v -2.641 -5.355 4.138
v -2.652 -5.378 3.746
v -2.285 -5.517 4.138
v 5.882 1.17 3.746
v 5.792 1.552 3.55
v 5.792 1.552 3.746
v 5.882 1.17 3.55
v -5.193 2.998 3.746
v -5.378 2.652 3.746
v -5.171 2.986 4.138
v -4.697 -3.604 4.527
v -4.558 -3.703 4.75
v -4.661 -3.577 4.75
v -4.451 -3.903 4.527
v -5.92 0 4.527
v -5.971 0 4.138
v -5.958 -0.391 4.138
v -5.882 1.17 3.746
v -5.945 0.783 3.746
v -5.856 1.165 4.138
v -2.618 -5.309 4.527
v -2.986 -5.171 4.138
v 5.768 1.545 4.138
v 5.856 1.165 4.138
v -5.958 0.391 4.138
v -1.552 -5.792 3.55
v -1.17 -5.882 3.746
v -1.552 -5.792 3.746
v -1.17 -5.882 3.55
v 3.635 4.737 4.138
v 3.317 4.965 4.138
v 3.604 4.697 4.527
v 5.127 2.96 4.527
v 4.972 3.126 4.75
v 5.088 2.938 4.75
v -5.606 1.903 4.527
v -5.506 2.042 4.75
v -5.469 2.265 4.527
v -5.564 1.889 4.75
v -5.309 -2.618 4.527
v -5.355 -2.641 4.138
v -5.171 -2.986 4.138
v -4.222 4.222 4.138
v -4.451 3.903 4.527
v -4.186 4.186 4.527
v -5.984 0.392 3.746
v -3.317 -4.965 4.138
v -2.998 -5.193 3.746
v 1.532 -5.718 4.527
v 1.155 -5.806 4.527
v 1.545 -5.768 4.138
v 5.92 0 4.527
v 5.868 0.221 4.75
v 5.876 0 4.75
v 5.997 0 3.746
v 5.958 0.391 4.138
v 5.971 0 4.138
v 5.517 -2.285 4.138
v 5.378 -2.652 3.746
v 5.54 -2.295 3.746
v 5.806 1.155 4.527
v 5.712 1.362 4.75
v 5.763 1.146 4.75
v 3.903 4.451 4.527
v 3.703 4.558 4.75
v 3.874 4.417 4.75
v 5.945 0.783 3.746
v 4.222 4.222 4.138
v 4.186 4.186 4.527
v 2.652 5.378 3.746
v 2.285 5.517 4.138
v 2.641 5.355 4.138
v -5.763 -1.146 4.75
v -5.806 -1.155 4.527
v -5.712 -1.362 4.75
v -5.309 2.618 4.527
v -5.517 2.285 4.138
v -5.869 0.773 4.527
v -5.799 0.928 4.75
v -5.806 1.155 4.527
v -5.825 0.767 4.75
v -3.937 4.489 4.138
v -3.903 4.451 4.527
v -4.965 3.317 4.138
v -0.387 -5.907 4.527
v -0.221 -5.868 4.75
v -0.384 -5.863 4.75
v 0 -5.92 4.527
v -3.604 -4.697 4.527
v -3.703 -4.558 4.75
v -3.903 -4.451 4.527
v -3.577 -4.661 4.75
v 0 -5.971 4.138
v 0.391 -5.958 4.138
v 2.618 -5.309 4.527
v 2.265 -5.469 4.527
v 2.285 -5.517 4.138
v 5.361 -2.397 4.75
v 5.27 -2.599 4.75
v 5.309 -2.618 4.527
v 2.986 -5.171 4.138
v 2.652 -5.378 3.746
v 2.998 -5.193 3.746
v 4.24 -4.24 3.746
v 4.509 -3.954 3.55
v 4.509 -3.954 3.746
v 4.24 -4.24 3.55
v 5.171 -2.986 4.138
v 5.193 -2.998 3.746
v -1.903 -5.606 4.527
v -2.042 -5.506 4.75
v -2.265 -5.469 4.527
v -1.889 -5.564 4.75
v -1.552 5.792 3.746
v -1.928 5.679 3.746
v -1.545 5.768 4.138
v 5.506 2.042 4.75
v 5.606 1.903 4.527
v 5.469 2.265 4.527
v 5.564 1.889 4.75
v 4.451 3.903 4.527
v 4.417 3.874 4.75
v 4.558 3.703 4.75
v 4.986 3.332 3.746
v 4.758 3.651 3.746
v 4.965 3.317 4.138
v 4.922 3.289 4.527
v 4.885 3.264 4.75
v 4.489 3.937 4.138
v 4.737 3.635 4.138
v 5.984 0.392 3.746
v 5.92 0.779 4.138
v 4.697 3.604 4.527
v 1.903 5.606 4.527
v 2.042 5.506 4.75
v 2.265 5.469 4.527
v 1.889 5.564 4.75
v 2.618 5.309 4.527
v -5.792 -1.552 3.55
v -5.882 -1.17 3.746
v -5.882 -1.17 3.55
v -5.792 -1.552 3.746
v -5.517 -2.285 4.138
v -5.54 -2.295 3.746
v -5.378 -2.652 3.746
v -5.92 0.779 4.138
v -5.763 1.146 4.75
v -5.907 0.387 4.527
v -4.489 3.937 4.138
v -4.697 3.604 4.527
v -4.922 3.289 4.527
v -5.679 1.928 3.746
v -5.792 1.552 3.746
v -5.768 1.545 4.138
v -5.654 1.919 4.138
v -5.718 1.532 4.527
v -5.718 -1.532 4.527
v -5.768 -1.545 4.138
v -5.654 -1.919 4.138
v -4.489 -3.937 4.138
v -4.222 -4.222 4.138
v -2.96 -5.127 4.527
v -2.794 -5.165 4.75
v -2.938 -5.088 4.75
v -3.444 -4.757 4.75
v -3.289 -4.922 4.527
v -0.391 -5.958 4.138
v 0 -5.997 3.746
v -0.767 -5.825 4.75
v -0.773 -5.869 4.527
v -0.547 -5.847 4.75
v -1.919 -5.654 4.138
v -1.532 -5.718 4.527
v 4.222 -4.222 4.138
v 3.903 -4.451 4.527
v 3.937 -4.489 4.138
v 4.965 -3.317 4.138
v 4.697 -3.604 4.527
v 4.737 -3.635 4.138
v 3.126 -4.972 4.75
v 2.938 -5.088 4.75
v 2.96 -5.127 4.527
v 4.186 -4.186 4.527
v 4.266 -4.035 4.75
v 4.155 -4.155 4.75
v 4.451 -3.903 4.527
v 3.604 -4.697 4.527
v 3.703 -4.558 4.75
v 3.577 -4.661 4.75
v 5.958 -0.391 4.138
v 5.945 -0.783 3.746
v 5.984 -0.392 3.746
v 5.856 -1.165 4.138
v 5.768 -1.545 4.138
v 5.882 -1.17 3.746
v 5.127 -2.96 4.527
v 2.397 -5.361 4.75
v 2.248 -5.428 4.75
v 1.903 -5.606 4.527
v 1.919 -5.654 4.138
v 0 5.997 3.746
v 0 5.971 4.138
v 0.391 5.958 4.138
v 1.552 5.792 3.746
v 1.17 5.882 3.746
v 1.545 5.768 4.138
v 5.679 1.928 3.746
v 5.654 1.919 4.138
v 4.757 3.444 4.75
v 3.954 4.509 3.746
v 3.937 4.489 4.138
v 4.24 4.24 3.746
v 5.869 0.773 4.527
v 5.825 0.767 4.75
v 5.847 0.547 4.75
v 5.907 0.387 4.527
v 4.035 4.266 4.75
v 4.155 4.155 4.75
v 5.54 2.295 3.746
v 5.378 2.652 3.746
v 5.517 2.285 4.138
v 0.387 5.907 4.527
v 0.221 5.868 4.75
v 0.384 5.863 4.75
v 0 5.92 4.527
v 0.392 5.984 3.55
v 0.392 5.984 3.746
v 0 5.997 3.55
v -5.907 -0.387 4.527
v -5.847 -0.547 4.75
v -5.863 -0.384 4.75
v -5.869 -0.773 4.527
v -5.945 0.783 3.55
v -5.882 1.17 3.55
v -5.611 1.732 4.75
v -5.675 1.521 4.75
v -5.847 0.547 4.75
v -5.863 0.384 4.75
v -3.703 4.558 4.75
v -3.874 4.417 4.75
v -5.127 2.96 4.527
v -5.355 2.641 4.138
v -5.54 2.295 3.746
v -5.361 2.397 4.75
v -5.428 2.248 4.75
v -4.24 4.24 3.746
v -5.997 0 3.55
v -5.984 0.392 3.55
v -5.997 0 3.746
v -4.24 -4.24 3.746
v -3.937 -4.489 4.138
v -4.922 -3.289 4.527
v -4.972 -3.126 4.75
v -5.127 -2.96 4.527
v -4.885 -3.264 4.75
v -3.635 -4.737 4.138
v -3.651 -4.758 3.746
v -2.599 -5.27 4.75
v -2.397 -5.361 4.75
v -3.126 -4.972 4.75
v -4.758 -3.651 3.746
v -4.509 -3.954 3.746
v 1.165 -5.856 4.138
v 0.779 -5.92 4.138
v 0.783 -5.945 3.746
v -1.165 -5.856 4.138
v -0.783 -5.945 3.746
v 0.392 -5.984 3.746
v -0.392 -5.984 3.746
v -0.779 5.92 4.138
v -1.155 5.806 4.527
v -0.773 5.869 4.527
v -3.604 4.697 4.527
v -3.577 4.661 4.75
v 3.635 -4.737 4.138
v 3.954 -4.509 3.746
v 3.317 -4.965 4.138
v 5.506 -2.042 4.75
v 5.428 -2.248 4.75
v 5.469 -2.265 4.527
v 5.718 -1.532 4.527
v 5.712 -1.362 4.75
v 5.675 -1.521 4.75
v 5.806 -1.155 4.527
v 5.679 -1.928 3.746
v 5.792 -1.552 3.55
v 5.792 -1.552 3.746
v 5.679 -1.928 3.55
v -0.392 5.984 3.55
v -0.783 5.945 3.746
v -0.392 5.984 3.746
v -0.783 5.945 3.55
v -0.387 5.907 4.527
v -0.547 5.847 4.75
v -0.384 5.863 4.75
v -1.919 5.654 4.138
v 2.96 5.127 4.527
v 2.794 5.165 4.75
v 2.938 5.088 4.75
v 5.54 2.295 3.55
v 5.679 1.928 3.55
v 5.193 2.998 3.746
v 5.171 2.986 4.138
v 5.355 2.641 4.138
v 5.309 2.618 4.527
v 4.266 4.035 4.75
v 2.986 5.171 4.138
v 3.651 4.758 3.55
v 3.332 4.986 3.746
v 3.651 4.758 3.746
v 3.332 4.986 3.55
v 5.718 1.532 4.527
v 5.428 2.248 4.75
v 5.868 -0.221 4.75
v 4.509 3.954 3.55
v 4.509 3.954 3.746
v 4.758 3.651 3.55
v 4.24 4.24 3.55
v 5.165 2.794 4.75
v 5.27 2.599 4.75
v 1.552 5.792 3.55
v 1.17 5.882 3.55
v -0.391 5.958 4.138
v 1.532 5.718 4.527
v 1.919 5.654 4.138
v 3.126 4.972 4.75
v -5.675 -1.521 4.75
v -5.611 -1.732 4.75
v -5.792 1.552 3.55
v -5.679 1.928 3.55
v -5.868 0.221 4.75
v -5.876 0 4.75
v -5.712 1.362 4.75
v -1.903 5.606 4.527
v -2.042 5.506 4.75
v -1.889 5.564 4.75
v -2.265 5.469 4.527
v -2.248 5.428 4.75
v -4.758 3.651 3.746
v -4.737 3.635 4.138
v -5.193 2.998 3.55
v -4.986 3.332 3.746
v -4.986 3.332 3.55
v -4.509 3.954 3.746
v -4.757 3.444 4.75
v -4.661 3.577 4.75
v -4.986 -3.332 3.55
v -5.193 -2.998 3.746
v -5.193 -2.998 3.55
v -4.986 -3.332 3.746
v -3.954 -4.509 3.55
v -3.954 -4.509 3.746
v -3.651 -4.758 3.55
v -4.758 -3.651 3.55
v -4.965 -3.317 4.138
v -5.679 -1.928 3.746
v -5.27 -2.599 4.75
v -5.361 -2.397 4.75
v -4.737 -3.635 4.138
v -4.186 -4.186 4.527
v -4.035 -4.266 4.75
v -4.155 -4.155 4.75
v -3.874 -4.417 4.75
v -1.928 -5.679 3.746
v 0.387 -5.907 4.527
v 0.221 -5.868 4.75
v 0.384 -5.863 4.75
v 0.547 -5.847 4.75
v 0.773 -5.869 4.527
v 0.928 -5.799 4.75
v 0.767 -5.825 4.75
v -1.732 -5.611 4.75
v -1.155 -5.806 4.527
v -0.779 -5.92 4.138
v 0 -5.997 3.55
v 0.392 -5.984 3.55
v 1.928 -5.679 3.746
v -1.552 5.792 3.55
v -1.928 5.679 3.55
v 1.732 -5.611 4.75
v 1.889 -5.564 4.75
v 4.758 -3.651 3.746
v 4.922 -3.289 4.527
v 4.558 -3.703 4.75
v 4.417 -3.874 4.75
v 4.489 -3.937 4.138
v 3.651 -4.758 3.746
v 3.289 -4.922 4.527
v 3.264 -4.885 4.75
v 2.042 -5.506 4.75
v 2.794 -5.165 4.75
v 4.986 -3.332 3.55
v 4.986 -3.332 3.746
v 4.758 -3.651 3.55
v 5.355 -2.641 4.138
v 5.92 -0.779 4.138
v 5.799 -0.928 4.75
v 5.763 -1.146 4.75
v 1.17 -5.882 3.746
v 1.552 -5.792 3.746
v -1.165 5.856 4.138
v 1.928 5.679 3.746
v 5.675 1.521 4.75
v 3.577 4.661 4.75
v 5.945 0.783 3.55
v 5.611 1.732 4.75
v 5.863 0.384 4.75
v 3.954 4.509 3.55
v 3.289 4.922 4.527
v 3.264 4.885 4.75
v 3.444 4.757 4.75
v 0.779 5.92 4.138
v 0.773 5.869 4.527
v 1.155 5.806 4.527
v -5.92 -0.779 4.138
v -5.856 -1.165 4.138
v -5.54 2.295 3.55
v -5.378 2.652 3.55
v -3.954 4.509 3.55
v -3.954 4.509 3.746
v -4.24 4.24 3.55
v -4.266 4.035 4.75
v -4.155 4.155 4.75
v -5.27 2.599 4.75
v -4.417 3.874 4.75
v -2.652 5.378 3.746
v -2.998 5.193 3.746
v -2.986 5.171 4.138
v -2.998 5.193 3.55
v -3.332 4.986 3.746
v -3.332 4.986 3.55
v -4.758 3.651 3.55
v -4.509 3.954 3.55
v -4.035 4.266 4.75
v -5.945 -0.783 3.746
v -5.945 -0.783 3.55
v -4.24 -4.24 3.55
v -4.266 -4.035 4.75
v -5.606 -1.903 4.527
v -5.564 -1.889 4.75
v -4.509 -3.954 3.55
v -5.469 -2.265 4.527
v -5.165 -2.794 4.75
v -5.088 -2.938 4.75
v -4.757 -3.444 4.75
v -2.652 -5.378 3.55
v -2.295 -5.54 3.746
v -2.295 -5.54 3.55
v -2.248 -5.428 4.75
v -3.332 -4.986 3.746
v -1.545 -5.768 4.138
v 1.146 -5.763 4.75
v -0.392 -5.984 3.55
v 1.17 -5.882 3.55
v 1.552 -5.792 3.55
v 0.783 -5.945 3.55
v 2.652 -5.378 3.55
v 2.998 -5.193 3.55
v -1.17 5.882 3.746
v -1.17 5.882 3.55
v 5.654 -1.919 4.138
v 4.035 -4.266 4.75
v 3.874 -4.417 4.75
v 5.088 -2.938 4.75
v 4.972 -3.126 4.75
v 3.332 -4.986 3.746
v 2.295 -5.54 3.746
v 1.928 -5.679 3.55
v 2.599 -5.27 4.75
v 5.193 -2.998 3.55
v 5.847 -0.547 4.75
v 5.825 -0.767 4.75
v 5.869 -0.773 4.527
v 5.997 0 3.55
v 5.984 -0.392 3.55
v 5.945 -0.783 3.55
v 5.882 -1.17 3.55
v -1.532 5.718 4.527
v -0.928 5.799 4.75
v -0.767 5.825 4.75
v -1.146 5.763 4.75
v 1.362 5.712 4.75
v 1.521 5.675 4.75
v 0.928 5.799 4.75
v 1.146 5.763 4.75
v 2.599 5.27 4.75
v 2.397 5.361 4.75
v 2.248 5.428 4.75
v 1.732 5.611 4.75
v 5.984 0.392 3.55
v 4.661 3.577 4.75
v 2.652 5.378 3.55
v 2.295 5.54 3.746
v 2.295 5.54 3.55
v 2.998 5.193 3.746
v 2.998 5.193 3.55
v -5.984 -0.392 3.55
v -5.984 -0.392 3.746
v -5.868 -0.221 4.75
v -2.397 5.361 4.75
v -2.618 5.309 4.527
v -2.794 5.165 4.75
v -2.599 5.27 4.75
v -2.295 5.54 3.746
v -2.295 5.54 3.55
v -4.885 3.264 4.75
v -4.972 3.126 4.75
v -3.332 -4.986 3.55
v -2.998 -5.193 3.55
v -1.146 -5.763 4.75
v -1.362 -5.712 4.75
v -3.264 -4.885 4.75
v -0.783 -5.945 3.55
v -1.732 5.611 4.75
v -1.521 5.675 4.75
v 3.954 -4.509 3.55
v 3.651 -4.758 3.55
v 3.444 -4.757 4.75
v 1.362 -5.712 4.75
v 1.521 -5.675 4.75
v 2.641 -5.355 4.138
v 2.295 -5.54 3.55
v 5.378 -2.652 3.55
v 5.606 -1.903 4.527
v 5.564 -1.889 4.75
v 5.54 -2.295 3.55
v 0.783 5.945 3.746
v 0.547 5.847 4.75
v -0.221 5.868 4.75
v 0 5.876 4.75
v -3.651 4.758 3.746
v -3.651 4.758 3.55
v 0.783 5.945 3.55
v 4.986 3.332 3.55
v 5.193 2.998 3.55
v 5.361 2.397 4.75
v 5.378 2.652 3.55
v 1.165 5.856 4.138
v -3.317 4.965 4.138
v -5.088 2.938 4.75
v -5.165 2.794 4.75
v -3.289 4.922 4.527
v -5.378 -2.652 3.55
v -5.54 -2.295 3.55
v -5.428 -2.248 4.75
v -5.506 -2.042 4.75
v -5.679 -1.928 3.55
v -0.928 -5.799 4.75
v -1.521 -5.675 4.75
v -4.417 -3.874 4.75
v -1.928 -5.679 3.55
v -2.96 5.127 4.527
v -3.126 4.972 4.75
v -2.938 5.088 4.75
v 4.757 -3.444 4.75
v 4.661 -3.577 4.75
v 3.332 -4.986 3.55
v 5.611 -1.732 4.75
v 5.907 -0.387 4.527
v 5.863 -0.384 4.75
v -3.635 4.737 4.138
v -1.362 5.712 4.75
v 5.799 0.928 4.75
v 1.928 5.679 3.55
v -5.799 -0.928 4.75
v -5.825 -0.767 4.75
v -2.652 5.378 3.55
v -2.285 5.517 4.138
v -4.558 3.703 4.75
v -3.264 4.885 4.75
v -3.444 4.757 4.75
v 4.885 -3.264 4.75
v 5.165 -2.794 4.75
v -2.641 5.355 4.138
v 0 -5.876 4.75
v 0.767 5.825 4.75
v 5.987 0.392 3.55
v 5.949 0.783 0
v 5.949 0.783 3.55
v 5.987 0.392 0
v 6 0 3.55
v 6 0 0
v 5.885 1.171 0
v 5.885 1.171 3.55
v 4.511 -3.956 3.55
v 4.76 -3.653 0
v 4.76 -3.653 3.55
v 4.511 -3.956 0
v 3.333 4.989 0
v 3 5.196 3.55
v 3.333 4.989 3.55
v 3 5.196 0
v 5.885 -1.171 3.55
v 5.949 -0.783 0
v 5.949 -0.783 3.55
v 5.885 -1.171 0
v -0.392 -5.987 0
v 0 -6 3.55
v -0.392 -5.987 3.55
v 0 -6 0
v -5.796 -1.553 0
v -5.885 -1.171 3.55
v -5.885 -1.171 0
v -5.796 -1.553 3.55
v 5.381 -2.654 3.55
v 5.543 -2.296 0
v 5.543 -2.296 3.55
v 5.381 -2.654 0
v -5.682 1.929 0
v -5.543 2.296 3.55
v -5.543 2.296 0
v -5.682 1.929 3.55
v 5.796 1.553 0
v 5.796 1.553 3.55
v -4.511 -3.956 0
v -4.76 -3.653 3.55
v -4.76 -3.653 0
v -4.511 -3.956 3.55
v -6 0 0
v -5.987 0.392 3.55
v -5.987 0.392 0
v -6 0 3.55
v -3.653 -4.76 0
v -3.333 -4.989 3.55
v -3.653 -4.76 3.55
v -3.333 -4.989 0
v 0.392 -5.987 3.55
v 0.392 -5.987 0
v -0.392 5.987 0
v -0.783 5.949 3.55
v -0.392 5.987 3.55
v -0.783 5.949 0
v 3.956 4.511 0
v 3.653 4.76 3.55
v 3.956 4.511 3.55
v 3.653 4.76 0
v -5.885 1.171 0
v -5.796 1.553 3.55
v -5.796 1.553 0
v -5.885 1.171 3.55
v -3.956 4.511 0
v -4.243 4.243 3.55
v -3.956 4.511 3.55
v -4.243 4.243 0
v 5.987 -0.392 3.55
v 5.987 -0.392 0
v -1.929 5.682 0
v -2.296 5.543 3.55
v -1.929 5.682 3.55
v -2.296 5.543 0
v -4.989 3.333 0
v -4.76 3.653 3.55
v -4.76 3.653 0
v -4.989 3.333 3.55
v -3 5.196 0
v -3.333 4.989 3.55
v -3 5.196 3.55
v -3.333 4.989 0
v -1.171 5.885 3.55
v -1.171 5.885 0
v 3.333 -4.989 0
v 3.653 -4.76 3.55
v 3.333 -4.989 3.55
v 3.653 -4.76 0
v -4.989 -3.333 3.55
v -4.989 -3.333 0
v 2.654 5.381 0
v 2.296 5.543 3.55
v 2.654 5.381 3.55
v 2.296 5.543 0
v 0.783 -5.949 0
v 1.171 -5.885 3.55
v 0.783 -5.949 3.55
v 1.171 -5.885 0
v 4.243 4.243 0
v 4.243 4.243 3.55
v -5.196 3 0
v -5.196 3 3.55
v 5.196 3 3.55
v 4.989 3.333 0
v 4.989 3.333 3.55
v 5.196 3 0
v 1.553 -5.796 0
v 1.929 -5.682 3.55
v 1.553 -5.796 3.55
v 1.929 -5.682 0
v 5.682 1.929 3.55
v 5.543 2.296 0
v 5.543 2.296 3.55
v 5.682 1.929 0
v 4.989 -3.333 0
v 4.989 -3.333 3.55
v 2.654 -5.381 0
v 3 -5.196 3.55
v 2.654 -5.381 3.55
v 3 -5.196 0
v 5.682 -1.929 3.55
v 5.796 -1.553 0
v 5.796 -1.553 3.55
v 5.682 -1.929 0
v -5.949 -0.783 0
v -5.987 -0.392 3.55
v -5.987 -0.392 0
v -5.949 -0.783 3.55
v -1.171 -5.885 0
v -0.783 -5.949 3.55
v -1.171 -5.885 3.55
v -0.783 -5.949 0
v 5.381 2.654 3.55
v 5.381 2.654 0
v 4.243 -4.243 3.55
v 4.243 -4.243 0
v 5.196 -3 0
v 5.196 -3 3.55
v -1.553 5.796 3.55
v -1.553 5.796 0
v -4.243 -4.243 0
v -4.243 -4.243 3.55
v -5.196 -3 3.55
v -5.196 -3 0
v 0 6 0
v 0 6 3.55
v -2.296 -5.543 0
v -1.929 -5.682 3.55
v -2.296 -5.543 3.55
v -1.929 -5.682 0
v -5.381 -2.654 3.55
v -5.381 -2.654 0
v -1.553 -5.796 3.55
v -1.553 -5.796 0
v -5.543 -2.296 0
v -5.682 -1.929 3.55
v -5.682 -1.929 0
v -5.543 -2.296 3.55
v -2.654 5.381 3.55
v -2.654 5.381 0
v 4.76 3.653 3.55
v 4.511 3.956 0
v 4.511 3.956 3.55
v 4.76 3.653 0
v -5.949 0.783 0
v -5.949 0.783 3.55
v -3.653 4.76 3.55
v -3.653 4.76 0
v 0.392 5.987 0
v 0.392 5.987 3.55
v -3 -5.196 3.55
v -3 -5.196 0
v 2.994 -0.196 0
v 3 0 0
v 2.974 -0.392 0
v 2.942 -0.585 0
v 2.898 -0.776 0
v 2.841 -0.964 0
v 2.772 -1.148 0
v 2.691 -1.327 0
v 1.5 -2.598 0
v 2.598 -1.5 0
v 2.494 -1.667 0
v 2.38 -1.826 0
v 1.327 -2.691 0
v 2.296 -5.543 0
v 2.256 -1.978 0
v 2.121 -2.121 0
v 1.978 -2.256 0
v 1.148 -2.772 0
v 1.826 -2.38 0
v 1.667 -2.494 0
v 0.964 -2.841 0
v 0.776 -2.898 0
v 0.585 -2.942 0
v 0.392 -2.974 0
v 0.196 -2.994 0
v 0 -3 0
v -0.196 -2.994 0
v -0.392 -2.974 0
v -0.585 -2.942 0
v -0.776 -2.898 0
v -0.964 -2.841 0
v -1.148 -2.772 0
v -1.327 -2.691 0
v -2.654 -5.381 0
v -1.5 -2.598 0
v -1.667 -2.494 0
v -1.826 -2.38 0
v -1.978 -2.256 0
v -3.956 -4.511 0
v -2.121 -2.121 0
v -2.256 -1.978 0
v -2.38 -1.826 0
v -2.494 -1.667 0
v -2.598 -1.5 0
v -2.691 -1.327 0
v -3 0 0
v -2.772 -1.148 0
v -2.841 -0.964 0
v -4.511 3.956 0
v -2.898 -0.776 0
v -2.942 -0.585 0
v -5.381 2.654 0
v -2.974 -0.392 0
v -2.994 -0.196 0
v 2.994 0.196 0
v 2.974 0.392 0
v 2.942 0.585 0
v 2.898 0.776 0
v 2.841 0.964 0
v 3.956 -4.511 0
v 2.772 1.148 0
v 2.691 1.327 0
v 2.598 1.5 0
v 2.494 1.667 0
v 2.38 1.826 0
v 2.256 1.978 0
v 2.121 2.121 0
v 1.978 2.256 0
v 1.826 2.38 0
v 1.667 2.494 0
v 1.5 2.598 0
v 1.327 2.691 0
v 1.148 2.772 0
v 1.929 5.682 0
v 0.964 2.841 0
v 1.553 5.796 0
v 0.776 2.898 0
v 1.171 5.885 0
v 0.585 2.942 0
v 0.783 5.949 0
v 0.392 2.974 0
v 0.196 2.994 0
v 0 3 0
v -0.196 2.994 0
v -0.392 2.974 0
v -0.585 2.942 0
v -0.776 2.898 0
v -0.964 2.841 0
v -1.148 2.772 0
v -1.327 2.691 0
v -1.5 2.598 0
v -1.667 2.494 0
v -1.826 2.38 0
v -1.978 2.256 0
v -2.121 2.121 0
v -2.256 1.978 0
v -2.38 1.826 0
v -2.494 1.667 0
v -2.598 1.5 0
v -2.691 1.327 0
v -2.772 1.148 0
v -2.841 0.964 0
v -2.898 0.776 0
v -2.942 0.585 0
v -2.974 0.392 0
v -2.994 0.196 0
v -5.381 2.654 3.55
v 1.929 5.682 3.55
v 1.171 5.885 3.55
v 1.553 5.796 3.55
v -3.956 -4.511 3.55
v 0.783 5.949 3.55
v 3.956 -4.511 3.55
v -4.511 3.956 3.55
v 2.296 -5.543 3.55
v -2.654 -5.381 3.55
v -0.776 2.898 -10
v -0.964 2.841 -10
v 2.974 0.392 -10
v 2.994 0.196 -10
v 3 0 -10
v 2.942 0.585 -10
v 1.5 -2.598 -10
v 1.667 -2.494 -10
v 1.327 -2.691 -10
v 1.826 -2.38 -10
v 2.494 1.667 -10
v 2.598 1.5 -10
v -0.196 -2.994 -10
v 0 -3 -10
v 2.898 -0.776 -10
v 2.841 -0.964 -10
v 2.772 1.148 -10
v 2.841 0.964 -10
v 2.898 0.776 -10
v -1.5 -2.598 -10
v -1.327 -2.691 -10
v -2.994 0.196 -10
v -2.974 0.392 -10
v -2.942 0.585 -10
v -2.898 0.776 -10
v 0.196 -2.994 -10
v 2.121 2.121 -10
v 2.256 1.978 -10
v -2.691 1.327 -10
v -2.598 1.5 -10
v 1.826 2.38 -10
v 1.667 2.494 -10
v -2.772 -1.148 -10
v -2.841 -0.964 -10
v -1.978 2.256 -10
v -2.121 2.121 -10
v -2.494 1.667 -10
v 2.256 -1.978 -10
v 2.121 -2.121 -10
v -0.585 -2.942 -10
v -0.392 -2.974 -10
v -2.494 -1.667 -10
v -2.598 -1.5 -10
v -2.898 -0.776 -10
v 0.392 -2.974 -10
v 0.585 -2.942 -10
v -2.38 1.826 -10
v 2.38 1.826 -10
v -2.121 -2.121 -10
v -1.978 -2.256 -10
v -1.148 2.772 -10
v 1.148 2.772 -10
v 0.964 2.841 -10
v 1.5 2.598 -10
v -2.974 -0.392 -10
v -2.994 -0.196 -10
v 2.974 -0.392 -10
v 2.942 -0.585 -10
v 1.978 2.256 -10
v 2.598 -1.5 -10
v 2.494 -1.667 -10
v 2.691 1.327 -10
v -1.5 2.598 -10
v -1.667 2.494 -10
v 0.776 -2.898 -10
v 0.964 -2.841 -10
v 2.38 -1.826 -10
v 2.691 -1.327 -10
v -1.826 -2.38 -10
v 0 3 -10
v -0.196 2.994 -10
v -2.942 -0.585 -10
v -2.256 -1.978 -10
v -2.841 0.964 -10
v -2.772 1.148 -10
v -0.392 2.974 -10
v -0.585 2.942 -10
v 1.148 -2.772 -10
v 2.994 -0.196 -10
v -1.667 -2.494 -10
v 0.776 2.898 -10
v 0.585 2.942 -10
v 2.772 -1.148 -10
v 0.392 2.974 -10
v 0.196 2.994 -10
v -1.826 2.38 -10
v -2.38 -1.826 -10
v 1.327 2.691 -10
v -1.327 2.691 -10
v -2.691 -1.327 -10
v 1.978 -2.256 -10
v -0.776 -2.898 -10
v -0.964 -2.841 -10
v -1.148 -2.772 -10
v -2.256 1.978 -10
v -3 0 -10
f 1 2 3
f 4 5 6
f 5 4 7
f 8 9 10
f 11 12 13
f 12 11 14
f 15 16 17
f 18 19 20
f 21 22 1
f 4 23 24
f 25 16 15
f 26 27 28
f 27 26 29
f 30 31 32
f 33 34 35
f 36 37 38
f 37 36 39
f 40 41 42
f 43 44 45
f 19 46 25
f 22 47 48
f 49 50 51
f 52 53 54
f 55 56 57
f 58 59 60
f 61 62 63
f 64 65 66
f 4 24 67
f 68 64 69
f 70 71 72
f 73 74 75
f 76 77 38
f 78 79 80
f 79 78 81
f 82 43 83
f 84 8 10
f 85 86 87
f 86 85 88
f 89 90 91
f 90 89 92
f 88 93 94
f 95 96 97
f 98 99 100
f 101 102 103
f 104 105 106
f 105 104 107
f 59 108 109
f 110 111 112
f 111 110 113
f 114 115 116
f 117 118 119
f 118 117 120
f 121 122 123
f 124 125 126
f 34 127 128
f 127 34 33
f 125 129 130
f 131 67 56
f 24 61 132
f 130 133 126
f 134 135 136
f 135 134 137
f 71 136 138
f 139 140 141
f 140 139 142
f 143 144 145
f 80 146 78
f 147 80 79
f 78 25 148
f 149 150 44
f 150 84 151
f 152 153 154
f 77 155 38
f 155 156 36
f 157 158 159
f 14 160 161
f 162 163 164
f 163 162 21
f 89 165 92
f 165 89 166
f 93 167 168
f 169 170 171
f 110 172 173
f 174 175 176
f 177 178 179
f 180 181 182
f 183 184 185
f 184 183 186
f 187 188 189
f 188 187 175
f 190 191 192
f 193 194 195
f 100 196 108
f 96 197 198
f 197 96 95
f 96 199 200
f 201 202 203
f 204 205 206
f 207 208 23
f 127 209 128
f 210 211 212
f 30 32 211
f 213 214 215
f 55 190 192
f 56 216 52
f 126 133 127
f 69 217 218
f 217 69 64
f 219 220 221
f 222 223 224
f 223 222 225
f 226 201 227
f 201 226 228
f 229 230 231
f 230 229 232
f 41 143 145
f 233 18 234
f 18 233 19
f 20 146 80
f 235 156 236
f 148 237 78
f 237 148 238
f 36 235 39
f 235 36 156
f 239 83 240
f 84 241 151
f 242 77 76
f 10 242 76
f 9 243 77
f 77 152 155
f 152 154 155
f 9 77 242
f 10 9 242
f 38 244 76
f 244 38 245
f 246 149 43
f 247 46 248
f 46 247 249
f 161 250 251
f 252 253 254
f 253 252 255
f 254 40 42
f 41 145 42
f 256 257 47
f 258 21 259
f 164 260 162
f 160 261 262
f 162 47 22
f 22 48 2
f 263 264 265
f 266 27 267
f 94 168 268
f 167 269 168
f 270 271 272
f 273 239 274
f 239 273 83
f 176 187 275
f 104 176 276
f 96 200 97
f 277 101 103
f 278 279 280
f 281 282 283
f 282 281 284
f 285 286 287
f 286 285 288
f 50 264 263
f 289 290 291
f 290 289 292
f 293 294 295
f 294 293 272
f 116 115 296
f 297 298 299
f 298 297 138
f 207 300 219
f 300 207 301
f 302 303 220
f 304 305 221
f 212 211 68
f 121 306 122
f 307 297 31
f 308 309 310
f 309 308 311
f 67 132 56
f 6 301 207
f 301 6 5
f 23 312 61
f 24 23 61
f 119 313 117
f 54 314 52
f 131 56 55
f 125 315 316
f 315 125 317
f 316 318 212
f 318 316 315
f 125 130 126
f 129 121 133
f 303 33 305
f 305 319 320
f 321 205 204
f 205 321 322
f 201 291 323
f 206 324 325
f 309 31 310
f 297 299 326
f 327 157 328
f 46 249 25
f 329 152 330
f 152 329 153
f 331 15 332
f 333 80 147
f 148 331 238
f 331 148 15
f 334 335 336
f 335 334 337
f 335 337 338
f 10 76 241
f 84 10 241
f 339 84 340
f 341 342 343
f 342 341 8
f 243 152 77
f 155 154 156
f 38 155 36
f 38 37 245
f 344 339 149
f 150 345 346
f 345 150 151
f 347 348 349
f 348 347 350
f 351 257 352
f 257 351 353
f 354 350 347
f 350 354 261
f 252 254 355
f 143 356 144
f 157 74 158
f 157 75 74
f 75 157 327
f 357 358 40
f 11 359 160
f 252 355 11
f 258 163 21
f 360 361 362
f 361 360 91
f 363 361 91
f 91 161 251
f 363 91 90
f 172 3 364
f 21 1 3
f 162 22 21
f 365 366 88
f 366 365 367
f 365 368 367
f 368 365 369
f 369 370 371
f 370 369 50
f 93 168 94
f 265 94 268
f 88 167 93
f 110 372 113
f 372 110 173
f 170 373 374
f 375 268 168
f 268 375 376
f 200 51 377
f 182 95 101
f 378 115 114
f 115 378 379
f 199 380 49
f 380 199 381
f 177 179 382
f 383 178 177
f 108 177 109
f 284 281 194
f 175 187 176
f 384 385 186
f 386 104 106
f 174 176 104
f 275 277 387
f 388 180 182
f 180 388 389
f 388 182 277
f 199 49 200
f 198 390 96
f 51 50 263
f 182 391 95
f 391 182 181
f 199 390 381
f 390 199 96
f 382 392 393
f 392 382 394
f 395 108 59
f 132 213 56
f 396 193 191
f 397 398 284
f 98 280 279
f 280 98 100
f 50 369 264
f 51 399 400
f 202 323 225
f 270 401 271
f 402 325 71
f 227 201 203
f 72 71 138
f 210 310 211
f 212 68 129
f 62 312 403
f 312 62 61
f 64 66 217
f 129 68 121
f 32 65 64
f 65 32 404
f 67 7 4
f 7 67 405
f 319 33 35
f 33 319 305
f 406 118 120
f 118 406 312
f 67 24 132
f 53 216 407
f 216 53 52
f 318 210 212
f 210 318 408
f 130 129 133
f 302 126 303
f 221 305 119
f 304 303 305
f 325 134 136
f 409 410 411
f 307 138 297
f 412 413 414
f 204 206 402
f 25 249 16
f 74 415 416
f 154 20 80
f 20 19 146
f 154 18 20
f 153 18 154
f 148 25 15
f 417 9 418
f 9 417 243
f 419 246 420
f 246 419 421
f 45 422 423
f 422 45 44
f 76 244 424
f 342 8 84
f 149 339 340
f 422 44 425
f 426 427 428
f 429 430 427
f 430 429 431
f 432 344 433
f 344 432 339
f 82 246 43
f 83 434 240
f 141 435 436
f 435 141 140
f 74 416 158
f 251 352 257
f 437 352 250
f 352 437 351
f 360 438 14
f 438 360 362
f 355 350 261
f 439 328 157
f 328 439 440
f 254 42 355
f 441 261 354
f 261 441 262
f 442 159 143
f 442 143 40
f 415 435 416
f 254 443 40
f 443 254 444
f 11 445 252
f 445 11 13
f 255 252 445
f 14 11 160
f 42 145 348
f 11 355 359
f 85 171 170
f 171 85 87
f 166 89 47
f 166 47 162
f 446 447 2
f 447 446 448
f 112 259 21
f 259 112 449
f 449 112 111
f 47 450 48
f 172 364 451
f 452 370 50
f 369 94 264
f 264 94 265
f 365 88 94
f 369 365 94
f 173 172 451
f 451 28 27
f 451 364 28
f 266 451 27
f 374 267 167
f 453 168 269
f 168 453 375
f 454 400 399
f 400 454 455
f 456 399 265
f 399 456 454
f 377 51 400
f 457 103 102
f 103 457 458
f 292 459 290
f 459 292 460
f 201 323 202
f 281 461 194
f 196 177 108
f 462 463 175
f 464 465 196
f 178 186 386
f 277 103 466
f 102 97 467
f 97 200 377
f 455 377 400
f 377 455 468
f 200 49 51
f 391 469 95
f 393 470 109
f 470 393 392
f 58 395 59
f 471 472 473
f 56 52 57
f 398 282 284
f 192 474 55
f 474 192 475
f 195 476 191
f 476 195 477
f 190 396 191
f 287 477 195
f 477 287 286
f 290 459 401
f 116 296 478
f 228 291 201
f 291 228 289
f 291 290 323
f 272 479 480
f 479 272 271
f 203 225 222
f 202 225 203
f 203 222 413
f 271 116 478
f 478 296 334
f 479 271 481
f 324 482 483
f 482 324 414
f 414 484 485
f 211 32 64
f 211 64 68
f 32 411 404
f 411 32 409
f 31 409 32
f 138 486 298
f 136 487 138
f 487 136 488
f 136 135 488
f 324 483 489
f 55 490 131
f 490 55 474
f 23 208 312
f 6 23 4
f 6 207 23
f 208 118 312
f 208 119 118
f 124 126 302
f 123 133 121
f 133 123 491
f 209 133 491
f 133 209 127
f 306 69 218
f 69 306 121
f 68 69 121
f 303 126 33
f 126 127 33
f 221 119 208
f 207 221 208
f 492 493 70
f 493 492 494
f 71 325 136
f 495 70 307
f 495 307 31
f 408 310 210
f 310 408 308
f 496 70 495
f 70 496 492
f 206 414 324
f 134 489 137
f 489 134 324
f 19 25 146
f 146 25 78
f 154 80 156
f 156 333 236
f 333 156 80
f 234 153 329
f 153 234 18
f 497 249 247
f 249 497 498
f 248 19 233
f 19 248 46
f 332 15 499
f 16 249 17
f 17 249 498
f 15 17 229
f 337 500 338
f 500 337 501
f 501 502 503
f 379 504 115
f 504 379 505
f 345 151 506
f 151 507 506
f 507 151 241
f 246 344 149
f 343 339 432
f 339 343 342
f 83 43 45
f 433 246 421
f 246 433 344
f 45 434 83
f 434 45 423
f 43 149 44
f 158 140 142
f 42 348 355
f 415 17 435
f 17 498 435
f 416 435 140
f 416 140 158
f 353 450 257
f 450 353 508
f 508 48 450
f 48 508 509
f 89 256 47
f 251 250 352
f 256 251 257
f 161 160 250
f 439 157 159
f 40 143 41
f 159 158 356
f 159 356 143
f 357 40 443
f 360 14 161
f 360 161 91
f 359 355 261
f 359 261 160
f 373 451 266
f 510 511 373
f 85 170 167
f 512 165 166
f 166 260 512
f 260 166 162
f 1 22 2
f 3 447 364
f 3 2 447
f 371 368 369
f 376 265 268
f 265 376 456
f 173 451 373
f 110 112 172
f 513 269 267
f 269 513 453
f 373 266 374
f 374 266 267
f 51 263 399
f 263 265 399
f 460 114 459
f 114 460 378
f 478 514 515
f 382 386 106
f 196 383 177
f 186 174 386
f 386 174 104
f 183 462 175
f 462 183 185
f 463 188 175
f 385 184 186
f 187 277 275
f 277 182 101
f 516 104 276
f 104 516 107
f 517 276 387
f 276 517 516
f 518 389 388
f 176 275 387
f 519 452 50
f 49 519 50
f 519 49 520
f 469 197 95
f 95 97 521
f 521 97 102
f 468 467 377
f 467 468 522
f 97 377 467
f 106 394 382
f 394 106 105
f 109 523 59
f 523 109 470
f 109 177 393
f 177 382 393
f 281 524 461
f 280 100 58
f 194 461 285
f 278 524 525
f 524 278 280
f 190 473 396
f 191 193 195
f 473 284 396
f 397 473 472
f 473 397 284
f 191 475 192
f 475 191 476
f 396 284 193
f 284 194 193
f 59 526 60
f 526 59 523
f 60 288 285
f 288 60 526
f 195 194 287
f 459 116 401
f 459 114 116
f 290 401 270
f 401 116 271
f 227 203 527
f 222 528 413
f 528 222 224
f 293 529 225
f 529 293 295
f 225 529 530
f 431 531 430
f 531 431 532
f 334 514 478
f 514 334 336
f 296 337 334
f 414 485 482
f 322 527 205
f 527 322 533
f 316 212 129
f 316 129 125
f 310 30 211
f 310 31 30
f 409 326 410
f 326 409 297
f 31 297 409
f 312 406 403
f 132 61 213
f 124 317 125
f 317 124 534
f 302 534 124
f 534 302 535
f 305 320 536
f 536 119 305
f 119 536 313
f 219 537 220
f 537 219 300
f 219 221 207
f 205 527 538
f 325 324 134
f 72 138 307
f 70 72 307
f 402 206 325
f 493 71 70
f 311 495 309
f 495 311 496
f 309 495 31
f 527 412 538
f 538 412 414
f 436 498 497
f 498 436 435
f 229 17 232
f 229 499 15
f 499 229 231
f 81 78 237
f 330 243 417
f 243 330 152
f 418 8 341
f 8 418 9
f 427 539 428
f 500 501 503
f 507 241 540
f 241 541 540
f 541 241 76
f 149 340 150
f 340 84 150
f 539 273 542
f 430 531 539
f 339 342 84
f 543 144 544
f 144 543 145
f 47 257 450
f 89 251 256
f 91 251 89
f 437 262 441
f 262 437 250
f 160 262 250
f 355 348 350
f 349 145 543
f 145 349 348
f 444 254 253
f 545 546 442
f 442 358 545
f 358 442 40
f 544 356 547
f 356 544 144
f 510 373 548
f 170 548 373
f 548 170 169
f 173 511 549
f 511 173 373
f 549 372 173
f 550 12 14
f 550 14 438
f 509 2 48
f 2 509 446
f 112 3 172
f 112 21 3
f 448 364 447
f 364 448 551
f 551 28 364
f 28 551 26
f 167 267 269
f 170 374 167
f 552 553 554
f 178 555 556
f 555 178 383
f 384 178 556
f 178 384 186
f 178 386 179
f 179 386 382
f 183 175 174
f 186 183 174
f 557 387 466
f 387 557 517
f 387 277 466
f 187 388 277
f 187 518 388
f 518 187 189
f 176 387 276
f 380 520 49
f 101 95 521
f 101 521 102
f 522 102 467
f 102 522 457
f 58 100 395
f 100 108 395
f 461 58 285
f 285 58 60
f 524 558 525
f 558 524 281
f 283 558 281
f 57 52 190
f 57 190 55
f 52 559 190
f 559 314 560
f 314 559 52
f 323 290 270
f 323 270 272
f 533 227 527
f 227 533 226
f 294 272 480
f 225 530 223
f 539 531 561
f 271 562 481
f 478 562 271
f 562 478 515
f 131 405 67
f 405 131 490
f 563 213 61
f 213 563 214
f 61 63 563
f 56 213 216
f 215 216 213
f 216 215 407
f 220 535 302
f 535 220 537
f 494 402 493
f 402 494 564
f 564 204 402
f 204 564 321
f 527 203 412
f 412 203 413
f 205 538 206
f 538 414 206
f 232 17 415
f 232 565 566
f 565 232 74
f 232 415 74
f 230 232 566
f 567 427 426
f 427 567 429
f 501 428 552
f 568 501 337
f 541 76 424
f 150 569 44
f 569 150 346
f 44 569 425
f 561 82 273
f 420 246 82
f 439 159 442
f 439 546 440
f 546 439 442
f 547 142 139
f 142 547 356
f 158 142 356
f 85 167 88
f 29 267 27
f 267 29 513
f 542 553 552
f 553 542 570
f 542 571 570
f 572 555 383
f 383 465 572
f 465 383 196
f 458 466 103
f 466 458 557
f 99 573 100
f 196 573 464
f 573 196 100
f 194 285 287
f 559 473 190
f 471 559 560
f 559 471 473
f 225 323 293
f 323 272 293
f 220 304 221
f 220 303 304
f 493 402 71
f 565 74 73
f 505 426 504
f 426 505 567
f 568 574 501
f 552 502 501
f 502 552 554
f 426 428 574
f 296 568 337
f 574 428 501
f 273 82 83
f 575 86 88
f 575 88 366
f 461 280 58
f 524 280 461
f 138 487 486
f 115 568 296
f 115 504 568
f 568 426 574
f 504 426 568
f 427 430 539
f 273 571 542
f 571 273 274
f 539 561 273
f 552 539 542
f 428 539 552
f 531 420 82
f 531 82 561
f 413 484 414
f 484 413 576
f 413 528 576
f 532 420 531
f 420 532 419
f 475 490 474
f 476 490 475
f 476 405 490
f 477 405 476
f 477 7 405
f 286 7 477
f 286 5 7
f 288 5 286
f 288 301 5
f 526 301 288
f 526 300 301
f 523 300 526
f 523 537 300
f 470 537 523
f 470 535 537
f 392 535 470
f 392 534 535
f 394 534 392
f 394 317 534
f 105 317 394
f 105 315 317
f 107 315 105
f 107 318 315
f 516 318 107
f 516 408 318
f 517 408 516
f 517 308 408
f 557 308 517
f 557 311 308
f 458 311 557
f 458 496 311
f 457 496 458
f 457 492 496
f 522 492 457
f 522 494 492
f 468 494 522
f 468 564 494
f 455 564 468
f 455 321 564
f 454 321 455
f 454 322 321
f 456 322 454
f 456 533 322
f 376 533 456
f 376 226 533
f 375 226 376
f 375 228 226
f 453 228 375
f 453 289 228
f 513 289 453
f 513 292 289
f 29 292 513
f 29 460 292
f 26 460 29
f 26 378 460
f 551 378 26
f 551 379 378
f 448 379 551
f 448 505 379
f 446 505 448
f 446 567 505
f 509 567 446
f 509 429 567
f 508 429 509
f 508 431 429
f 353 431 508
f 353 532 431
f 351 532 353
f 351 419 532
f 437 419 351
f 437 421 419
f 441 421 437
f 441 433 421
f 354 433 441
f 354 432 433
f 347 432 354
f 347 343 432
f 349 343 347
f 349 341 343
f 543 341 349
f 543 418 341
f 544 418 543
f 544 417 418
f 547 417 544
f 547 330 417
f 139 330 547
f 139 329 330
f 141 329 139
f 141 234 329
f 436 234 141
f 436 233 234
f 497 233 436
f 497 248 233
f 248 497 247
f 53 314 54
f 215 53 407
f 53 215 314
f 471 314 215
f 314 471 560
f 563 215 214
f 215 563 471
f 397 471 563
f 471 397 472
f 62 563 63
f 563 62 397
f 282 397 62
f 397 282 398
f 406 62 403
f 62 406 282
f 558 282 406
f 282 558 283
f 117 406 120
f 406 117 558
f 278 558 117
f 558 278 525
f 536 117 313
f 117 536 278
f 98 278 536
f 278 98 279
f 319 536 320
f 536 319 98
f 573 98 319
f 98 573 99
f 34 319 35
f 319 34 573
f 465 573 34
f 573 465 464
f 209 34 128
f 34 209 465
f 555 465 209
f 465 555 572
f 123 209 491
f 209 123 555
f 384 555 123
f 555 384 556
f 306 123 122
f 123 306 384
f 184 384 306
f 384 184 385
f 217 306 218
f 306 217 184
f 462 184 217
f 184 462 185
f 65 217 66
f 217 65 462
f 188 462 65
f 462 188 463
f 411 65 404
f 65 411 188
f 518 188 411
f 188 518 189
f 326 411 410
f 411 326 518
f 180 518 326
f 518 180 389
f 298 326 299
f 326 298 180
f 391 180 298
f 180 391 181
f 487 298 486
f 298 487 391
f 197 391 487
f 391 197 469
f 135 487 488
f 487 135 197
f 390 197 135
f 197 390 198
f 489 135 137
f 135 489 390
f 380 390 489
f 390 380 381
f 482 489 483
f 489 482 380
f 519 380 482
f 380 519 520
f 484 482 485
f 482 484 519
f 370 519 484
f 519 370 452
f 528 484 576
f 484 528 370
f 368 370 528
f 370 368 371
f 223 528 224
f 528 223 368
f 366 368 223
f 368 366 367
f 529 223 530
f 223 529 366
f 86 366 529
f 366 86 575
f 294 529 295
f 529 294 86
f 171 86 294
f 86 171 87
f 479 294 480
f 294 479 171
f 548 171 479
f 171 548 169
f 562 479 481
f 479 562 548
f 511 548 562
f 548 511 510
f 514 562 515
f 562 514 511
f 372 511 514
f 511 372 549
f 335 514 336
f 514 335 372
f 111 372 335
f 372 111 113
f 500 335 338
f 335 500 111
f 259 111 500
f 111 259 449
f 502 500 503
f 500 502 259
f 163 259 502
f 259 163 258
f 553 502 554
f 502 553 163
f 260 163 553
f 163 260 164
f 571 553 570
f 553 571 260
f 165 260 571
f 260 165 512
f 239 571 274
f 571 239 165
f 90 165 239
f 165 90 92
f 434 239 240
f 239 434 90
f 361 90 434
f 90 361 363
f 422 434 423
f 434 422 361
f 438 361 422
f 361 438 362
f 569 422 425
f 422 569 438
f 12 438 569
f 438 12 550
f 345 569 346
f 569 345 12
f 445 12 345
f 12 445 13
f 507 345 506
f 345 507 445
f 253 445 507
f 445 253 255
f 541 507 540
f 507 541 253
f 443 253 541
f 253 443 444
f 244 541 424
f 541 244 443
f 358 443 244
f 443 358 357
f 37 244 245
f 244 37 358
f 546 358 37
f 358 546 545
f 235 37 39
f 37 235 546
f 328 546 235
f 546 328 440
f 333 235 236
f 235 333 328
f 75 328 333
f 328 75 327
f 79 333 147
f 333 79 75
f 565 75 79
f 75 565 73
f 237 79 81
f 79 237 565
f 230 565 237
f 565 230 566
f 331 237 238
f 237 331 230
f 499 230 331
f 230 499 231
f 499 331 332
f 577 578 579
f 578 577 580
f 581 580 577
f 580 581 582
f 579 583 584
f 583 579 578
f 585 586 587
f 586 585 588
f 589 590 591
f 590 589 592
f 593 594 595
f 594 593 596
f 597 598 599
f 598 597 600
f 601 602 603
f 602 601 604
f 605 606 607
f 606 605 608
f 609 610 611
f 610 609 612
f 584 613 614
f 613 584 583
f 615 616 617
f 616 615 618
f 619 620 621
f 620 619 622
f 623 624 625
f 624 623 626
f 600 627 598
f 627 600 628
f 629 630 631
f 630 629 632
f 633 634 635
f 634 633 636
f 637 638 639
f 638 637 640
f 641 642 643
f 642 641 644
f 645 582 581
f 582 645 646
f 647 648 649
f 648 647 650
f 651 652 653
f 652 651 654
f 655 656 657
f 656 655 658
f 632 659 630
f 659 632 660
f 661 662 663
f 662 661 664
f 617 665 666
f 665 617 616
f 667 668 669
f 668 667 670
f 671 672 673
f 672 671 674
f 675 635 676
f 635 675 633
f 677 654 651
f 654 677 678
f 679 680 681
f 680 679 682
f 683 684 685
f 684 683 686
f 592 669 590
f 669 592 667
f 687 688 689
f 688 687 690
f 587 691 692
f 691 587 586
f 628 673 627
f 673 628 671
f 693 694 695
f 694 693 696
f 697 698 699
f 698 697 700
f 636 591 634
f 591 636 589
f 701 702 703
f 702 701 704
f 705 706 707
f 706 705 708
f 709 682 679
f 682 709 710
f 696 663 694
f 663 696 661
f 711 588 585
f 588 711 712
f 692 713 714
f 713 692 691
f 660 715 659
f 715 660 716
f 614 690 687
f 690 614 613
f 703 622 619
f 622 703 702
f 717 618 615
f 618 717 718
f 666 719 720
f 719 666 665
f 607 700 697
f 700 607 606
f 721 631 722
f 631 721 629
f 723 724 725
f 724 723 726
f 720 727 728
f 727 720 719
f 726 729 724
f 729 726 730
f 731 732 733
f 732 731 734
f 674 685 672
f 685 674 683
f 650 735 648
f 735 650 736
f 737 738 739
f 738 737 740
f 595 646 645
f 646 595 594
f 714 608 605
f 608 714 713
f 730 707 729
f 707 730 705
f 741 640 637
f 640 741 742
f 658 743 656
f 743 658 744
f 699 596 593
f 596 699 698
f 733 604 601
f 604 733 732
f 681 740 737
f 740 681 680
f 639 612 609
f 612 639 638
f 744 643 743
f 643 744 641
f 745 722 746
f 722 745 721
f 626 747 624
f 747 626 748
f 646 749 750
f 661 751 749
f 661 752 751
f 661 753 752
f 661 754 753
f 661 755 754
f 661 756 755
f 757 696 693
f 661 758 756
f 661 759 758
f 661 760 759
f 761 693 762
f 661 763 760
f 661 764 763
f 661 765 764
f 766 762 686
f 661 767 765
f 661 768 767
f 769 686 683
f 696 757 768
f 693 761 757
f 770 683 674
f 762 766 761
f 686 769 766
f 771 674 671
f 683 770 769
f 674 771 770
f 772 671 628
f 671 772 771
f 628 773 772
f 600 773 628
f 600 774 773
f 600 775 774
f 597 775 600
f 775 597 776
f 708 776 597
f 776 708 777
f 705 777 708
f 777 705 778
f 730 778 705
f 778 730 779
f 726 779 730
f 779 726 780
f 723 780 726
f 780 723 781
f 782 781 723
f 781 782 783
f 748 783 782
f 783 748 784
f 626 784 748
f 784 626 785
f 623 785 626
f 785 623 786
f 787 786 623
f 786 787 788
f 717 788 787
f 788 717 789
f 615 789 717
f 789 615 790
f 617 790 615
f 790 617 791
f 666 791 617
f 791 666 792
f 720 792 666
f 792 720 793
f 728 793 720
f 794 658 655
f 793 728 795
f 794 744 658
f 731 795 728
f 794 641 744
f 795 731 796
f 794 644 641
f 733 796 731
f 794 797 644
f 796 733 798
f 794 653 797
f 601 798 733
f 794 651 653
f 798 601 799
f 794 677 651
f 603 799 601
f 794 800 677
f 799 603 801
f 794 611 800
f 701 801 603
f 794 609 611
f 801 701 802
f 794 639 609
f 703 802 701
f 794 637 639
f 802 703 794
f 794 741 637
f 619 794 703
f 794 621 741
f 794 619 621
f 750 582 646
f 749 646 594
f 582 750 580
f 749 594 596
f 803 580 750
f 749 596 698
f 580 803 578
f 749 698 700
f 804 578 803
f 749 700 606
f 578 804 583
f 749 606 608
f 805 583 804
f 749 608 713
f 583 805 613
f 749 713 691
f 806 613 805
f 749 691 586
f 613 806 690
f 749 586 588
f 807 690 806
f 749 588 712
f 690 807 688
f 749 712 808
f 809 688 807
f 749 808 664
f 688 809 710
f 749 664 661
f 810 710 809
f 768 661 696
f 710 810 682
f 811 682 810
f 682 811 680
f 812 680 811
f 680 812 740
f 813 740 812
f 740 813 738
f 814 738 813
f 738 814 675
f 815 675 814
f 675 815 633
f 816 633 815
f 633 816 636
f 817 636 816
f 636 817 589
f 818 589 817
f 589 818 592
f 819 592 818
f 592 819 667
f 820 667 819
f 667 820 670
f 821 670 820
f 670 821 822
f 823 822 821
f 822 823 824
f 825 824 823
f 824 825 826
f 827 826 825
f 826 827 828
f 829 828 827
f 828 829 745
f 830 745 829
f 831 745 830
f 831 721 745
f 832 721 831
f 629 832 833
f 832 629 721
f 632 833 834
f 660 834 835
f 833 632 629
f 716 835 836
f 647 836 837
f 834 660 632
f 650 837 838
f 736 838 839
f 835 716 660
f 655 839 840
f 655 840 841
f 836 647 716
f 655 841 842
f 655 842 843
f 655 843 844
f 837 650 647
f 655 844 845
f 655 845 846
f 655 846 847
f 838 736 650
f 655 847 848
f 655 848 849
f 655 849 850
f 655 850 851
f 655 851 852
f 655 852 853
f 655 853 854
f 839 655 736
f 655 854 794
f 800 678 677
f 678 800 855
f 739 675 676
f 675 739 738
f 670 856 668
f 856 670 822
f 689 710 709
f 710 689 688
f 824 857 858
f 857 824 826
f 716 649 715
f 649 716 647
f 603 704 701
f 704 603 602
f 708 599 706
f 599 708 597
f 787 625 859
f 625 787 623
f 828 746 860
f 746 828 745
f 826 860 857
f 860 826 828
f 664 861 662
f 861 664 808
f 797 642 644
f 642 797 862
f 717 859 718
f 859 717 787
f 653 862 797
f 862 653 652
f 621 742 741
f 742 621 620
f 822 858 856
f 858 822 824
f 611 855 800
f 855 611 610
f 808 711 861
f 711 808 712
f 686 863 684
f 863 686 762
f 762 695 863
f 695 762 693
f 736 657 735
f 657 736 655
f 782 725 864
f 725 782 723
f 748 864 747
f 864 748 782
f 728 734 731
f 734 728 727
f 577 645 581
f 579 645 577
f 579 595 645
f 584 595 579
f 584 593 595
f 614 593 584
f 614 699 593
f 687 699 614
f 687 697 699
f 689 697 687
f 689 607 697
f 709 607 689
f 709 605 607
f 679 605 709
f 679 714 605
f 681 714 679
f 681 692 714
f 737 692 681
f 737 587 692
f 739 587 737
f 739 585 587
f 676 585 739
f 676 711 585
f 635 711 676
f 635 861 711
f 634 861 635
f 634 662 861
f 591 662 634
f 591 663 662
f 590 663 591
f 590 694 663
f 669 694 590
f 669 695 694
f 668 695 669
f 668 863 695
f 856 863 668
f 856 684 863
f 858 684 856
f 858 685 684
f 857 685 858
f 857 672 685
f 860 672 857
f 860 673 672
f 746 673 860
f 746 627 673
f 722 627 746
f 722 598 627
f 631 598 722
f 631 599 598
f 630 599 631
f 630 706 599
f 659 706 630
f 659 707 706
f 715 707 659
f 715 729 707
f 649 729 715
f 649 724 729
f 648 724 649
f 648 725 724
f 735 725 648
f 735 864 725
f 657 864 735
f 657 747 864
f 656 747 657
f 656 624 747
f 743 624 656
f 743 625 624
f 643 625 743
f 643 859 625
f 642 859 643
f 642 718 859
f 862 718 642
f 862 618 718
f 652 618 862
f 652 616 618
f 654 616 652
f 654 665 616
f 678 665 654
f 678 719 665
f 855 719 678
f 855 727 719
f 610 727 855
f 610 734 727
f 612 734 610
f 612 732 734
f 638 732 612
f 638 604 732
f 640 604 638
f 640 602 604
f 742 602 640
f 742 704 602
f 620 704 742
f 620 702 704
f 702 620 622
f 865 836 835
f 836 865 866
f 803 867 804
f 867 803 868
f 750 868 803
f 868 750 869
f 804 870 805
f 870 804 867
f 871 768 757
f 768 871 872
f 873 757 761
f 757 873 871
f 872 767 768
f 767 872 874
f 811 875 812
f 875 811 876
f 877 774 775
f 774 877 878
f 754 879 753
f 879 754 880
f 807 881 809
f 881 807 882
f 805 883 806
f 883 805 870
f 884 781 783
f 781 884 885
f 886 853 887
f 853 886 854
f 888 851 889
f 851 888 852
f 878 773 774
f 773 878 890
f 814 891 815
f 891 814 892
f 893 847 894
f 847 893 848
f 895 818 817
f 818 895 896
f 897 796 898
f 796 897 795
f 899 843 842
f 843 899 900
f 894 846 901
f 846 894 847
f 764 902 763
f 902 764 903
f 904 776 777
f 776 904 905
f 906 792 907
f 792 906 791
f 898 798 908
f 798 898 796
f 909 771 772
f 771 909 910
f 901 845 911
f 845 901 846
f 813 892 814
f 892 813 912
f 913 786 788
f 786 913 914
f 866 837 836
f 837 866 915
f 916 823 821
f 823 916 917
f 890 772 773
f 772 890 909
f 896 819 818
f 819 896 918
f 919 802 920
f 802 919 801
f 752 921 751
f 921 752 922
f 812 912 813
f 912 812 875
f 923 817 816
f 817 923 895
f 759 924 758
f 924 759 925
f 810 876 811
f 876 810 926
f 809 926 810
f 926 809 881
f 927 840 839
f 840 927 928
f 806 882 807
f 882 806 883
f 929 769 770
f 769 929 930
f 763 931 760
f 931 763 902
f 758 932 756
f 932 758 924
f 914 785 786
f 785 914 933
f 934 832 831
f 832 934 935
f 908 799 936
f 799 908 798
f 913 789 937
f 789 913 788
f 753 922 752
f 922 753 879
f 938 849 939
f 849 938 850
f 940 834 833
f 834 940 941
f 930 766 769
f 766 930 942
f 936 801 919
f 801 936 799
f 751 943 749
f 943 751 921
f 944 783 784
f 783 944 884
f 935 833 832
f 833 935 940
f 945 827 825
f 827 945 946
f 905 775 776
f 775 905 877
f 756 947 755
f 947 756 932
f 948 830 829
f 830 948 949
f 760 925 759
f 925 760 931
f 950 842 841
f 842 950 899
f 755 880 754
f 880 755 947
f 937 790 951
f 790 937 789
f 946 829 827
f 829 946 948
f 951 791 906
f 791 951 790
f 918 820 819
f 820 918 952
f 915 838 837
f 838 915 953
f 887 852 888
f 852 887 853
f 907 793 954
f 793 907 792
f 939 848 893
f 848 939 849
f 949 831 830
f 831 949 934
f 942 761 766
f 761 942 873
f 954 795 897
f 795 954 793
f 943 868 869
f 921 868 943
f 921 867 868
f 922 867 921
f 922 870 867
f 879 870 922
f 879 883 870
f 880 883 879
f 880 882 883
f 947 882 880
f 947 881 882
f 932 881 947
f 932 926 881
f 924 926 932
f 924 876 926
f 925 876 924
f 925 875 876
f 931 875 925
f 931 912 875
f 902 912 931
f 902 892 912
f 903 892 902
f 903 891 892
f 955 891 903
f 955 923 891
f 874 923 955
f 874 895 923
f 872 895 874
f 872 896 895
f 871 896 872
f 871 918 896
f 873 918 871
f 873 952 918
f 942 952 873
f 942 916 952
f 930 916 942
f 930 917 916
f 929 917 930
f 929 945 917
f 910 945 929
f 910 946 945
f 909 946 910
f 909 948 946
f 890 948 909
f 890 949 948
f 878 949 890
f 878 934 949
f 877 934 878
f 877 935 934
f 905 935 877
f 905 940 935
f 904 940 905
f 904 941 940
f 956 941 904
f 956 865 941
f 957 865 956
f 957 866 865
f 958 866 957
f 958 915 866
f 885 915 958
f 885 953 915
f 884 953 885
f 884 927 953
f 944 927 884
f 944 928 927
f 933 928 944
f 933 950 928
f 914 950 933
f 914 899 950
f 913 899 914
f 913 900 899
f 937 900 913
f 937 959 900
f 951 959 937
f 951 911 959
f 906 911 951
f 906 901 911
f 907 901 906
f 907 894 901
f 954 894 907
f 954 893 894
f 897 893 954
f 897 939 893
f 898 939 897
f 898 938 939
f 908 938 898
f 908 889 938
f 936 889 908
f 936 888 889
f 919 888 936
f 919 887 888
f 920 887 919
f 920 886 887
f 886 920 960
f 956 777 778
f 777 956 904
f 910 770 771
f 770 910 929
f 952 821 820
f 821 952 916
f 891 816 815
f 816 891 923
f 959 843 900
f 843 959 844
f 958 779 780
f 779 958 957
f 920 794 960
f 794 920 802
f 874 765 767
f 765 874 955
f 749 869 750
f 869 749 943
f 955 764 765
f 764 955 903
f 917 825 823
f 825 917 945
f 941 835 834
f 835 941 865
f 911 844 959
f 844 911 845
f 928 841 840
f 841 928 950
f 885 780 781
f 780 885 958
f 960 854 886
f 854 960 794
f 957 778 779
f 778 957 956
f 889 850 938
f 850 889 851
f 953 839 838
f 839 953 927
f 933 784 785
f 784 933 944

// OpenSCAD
$fn=96;

d_shank = 6.0;
l_shank = 10.0;

d_head = 12.0;
h_head = 4.75;

r_fillet = 0.8;
h_dome = 1.2;

module pan_head(d=12, h=4.75, dome=1.2, fillet=0.8) {
    base_h = max(0.01, h - dome);
    union() {
        cylinder(d=d, h=base_h);
        translate([0,0,base_h])
            intersection() {
                sphere(d=d);
                cylinder(d=d, h=dome);
            }
        if (fillet > 0) {
            translate([0,0,0])
                difference() {
                    cylinder(d=d, h=fillet);
                    translate([0,0,fillet])
                        rotate_extrude()
                            translate([d/2 - fillet, 0, 0])
                                circle(r=fillet, $fn=64);
                }
        }
    }
}

module screw() {
    union() {
        translate([0,0,-l_shank])
            cylinder(d=d_shank, h=l_shank);
        pan_head(d=d_head, h=h_head, dome=h_dome, fillet=r_fillet);
    }
}

screw();
